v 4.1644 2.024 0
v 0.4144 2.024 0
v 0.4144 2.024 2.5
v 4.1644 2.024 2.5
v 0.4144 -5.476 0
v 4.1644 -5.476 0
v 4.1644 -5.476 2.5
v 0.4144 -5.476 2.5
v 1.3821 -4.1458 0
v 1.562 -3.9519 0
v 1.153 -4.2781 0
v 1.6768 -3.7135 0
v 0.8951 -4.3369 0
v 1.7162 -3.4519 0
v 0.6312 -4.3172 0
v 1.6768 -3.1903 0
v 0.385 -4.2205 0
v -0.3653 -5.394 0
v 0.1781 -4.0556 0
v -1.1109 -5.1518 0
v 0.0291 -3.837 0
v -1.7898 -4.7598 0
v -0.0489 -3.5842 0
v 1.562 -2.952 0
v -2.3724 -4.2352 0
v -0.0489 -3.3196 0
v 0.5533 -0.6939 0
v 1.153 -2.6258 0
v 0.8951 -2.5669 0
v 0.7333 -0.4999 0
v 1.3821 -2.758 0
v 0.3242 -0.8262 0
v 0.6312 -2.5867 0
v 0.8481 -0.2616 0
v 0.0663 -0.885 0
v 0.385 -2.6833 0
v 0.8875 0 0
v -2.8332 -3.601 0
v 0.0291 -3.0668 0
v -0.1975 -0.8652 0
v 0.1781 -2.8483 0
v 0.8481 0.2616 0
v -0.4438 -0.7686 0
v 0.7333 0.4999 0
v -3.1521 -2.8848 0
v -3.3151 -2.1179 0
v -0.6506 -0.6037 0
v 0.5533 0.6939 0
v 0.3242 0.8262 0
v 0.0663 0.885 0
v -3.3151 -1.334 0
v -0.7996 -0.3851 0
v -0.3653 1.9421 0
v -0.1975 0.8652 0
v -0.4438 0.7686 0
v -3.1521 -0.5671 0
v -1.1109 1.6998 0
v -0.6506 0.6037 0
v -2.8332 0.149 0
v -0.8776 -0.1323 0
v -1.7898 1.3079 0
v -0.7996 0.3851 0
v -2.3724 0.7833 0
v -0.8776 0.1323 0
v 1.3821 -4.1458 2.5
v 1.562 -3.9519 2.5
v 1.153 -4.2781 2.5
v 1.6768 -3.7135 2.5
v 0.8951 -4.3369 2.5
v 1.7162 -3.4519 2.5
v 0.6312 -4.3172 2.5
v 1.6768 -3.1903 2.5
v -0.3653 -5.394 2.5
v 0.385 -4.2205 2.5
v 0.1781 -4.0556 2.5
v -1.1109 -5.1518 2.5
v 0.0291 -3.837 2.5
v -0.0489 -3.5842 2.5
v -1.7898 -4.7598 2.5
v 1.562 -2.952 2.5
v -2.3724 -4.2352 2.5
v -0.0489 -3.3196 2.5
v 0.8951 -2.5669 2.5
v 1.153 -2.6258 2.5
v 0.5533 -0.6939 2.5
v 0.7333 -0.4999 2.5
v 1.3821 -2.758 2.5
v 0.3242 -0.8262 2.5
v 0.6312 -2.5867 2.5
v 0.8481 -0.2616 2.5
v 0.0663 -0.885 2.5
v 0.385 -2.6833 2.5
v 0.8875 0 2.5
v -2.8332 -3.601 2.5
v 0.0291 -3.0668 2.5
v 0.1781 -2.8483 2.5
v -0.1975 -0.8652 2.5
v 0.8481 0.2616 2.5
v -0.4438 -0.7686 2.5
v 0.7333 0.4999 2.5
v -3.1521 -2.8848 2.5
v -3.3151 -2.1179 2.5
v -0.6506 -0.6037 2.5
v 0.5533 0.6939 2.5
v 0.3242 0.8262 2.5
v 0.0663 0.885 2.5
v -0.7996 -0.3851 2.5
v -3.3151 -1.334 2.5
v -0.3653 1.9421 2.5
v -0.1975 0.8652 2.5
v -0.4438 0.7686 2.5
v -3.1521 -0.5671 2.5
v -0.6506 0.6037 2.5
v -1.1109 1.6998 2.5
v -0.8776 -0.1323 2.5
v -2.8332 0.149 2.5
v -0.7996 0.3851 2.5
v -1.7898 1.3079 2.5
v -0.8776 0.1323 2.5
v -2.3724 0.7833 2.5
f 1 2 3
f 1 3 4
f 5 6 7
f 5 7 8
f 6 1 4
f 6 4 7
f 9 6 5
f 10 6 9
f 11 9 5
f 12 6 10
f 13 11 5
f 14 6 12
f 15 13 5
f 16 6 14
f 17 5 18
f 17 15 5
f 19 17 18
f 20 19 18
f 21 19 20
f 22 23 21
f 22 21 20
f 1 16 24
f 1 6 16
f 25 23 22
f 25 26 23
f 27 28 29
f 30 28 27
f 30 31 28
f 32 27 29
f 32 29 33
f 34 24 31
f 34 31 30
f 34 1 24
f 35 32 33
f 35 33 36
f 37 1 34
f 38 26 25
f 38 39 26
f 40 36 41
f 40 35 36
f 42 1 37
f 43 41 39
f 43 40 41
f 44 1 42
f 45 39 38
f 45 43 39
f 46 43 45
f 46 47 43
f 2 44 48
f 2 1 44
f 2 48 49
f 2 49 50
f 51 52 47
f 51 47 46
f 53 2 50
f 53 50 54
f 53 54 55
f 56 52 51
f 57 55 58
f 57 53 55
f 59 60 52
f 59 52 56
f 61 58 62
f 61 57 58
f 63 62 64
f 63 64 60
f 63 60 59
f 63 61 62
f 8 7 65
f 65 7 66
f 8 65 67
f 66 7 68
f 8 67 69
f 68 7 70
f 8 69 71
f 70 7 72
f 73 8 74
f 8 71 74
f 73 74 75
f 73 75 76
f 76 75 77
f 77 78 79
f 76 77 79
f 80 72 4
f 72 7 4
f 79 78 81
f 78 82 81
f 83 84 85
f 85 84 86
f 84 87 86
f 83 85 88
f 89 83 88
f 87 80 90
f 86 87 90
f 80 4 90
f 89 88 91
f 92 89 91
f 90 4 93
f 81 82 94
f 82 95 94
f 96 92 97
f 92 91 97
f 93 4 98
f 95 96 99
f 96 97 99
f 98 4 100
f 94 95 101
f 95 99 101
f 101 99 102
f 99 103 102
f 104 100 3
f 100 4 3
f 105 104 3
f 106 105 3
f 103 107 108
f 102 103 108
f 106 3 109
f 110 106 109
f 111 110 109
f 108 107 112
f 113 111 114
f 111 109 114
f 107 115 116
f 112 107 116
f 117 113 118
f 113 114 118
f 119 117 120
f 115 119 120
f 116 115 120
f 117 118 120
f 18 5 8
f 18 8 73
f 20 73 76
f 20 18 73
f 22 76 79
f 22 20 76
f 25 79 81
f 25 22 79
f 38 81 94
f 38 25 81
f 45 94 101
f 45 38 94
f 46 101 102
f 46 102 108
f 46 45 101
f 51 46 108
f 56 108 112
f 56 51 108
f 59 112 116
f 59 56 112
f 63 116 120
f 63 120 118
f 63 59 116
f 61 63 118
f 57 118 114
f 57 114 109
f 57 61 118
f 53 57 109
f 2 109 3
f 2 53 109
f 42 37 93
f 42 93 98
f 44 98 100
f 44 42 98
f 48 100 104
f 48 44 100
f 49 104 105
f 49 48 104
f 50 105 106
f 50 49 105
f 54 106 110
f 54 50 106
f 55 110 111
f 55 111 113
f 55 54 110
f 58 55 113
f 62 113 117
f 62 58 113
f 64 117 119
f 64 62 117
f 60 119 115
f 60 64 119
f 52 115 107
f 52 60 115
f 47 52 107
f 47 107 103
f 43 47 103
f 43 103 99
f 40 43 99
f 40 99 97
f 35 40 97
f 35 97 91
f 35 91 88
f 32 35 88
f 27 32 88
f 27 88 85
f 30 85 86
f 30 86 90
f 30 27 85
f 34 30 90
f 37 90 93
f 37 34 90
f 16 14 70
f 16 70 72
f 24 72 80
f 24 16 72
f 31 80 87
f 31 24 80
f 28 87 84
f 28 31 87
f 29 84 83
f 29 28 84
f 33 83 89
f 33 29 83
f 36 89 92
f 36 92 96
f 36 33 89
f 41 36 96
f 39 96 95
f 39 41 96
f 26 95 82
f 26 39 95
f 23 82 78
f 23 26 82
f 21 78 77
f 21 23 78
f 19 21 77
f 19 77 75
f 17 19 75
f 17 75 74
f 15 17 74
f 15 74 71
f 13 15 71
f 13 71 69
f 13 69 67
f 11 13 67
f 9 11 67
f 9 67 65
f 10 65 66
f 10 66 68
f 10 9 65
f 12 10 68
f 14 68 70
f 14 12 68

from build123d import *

# Parameters (mm, degrees)
SKETCH1_R           = 0.8875
BOSS_EXTRUDE1_DEPTH = 2.5


with BuildPart() as part:
    # Sketch1 → Boss-Extrude1 (new body)
    with BuildSketch(Plane.XY):
        with BuildLine():
            Line((0.414365521, 2.024043391), (4.164365521, 2.024043391))
            Line((4.164365521, 2.024043391), (4.164365521, -5.475956609))
            Line((4.164365521, -5.475956609), (0.414365521, -5.475956609))
            ThreePointArc((0.414365521, -5.475956609), (-3.335634479, -1.725956609), (0.414365521, 2.024043391))
        make_face()
        Circle(SKETCH1_R, mode=Mode.SUBTRACT)
        with Locations((0.828731042, -3.451913217)):
            Circle(SKETCH1_R, mode=Mode.SUBTRACT)
    extrude(amount=BOSS_EXTRUDE1_DEPTH)


solid = part.part
